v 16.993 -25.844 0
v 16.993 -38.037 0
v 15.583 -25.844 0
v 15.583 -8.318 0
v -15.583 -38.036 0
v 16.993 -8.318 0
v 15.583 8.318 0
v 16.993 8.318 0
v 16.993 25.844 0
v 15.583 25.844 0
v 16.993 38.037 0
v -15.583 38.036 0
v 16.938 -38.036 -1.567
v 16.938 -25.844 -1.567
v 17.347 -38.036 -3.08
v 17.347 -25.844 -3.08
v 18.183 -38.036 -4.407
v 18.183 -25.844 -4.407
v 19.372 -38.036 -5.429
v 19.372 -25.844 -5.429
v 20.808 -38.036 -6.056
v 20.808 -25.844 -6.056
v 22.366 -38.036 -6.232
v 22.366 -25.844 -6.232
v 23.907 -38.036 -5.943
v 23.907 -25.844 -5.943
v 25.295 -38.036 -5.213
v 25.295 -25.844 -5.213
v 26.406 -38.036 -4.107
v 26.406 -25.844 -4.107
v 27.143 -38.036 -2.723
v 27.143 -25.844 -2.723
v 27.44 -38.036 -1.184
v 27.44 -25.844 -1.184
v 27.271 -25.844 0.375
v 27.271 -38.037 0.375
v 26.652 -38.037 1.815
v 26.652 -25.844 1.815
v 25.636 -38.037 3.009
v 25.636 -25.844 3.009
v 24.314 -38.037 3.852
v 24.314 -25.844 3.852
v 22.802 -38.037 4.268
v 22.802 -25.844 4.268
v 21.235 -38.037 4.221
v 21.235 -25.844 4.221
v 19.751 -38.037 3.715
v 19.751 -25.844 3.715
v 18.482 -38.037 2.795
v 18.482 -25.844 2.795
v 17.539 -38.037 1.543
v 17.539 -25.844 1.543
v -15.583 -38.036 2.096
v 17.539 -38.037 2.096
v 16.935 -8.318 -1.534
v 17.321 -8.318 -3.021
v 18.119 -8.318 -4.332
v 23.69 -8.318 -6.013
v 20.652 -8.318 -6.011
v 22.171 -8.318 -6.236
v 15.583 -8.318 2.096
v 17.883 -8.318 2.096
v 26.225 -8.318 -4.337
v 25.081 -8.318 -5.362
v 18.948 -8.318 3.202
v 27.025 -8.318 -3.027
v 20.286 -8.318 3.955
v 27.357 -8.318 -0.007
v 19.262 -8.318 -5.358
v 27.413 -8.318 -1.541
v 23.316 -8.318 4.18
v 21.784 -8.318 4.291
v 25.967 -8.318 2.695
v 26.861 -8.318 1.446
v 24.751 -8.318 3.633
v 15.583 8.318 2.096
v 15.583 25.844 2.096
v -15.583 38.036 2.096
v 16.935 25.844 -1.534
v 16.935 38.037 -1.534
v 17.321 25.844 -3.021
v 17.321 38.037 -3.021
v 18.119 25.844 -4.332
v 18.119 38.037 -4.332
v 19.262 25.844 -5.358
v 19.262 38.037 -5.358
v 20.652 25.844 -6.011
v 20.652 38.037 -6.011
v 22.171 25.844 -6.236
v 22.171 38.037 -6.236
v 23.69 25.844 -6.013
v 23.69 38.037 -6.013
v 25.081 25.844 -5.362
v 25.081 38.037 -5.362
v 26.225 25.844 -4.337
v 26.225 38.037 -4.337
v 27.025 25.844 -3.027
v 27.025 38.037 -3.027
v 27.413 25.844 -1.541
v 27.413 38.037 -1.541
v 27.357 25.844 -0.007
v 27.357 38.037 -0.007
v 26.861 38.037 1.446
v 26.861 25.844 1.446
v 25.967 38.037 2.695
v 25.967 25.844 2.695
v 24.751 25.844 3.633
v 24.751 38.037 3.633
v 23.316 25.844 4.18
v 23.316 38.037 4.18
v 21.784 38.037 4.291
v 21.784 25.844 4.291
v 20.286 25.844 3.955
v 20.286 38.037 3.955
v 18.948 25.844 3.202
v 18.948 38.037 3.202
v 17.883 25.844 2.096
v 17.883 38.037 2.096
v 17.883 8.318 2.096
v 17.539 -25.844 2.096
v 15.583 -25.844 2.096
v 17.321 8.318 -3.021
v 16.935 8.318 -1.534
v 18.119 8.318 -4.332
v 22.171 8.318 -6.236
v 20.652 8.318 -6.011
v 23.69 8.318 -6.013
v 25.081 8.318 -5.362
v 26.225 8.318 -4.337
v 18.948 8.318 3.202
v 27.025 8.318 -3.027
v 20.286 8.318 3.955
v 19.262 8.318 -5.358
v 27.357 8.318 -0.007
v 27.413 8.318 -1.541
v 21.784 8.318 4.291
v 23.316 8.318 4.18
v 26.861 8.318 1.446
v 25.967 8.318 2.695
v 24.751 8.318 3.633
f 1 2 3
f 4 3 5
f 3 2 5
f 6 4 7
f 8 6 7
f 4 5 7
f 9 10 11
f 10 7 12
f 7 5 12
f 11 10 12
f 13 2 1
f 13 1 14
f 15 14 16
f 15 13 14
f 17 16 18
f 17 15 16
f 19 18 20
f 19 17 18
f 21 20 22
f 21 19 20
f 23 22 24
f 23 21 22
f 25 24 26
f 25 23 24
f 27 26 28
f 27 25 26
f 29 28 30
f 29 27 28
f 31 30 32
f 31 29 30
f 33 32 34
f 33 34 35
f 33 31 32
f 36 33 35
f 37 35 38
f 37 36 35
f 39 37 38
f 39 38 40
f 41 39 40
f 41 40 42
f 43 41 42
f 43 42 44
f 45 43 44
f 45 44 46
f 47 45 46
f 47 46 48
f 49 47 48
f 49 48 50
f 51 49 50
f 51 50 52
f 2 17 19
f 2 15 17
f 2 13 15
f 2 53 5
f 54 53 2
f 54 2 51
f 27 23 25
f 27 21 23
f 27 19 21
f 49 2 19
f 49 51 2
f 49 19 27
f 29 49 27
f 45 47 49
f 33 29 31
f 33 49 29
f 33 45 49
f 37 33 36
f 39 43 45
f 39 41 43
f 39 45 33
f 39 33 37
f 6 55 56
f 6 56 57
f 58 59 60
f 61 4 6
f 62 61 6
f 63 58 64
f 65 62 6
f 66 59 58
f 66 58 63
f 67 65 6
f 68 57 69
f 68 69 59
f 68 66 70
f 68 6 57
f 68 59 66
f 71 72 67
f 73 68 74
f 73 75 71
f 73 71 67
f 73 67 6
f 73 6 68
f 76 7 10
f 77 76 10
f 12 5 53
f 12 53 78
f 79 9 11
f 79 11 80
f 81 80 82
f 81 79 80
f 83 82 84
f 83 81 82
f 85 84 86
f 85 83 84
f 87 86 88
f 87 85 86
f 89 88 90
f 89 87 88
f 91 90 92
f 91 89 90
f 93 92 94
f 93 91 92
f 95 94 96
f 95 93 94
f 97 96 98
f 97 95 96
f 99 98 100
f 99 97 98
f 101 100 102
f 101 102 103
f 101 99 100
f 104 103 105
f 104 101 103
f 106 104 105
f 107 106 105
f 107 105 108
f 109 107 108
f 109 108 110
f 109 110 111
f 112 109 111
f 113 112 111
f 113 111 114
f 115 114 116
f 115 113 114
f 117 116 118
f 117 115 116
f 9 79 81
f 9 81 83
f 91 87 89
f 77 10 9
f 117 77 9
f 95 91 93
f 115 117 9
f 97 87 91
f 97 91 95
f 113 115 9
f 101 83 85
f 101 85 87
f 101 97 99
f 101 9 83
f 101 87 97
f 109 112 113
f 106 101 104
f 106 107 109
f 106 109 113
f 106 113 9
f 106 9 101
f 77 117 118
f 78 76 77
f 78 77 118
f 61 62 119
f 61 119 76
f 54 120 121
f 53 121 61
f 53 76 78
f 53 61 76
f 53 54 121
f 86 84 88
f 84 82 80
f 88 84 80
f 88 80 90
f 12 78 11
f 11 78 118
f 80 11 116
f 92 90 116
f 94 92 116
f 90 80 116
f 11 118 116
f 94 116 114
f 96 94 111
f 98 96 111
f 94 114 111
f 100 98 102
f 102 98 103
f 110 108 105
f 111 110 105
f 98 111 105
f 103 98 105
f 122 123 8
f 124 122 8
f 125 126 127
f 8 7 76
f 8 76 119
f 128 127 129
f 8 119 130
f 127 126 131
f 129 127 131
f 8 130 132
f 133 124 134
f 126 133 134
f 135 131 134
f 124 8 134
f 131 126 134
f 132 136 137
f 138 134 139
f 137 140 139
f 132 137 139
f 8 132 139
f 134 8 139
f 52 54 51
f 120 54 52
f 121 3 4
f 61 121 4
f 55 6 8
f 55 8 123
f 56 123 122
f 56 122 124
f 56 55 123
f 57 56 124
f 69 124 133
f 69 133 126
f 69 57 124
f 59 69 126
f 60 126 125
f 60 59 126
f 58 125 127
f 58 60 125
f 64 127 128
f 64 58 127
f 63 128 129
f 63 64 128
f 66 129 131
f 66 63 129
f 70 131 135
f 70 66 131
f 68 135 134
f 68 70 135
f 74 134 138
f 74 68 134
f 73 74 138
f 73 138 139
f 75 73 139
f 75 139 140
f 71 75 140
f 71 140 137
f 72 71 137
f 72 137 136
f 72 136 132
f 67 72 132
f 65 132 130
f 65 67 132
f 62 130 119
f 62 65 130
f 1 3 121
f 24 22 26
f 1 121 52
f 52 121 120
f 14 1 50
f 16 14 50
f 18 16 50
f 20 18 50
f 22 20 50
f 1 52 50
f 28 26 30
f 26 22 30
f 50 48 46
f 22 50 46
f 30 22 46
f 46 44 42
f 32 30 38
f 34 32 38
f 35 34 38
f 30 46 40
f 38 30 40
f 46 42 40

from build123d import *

# Parameters (mm, degrees)
F0_W     = 31.1658
F0_H     = 76.073
F1_DEPTH = 2.0955
F2_W     = 12.192
F2_H     = 2.0955
F2_W_2   = 16.637
F3_DEPTH = 1.9558
F4_R     = 5.2705
F5_DEPTH = 12.192
F7_DEPTH = 16.637
F9_DEPTH = 12.192


with BuildPart() as f1:
    # F0 (on Top) → F1 (new body)
    with BuildSketch(Plane.XY):
        Rectangle(F0_W, F0_H)
    extrude(amount=F1_DEPTH)

    # F2 (on face) → F3 (join)
    with BuildSketch(Plane.YZ.offset(15.5829)):
        with Locations((-31.9405, 1.04775)):
            Rectangle(F2_W, F2_H)
        with Locations((0, 1.04775)):
            Rectangle(F2_W_2, F2_H)
        with Locations((31.9405, 1.04775)):
            Rectangle(F2_W, F2_H)
    extrude(amount=F3_DEPTH)

    # F4 (on face) → F5 (join, through all)
    with BuildSketch(Plane.XZ.offset(38.0365)):
        with Locations((22.1742, -0.9652)):
            Circle(F4_R)
    extrude(amount=-F5_DEPTH)

    # F6 (on face) → F7 (join, through all)
    with BuildSketch(Plane.XZ.offset(8.3185)):
        with BuildLine():
            Line((17.5387, 0), (16.992833, 0))
            ThreePointArc((16.992833, 0), (27.024756, -3.026821), (17.883479, 2.0955))
            Line((17.883479, 2.0955), (17.5387, 2.0955))
            Line((17.5387, 2.0955), (17.5387, 0))
        make_face()
    extrude(amount=-F7_DEPTH)

    # F8 (on face) → F9 (join, through all)
    with BuildSketch(Plane.XZ.offset(-25.8445)):
        with BuildLine():
            Line((17.5387, 0), (16.992833, 0))
            ThreePointArc((16.992833, 0), (27.024756, -3.026821), (17.883479, 2.0955))
            Line((17.883479, 2.0955), (17.5387, 2.0955))
            Line((17.5387, 2.0955), (17.5387, 0))
        make_face()
    extrude(amount=-F9_DEPTH)


solid = f1.part
